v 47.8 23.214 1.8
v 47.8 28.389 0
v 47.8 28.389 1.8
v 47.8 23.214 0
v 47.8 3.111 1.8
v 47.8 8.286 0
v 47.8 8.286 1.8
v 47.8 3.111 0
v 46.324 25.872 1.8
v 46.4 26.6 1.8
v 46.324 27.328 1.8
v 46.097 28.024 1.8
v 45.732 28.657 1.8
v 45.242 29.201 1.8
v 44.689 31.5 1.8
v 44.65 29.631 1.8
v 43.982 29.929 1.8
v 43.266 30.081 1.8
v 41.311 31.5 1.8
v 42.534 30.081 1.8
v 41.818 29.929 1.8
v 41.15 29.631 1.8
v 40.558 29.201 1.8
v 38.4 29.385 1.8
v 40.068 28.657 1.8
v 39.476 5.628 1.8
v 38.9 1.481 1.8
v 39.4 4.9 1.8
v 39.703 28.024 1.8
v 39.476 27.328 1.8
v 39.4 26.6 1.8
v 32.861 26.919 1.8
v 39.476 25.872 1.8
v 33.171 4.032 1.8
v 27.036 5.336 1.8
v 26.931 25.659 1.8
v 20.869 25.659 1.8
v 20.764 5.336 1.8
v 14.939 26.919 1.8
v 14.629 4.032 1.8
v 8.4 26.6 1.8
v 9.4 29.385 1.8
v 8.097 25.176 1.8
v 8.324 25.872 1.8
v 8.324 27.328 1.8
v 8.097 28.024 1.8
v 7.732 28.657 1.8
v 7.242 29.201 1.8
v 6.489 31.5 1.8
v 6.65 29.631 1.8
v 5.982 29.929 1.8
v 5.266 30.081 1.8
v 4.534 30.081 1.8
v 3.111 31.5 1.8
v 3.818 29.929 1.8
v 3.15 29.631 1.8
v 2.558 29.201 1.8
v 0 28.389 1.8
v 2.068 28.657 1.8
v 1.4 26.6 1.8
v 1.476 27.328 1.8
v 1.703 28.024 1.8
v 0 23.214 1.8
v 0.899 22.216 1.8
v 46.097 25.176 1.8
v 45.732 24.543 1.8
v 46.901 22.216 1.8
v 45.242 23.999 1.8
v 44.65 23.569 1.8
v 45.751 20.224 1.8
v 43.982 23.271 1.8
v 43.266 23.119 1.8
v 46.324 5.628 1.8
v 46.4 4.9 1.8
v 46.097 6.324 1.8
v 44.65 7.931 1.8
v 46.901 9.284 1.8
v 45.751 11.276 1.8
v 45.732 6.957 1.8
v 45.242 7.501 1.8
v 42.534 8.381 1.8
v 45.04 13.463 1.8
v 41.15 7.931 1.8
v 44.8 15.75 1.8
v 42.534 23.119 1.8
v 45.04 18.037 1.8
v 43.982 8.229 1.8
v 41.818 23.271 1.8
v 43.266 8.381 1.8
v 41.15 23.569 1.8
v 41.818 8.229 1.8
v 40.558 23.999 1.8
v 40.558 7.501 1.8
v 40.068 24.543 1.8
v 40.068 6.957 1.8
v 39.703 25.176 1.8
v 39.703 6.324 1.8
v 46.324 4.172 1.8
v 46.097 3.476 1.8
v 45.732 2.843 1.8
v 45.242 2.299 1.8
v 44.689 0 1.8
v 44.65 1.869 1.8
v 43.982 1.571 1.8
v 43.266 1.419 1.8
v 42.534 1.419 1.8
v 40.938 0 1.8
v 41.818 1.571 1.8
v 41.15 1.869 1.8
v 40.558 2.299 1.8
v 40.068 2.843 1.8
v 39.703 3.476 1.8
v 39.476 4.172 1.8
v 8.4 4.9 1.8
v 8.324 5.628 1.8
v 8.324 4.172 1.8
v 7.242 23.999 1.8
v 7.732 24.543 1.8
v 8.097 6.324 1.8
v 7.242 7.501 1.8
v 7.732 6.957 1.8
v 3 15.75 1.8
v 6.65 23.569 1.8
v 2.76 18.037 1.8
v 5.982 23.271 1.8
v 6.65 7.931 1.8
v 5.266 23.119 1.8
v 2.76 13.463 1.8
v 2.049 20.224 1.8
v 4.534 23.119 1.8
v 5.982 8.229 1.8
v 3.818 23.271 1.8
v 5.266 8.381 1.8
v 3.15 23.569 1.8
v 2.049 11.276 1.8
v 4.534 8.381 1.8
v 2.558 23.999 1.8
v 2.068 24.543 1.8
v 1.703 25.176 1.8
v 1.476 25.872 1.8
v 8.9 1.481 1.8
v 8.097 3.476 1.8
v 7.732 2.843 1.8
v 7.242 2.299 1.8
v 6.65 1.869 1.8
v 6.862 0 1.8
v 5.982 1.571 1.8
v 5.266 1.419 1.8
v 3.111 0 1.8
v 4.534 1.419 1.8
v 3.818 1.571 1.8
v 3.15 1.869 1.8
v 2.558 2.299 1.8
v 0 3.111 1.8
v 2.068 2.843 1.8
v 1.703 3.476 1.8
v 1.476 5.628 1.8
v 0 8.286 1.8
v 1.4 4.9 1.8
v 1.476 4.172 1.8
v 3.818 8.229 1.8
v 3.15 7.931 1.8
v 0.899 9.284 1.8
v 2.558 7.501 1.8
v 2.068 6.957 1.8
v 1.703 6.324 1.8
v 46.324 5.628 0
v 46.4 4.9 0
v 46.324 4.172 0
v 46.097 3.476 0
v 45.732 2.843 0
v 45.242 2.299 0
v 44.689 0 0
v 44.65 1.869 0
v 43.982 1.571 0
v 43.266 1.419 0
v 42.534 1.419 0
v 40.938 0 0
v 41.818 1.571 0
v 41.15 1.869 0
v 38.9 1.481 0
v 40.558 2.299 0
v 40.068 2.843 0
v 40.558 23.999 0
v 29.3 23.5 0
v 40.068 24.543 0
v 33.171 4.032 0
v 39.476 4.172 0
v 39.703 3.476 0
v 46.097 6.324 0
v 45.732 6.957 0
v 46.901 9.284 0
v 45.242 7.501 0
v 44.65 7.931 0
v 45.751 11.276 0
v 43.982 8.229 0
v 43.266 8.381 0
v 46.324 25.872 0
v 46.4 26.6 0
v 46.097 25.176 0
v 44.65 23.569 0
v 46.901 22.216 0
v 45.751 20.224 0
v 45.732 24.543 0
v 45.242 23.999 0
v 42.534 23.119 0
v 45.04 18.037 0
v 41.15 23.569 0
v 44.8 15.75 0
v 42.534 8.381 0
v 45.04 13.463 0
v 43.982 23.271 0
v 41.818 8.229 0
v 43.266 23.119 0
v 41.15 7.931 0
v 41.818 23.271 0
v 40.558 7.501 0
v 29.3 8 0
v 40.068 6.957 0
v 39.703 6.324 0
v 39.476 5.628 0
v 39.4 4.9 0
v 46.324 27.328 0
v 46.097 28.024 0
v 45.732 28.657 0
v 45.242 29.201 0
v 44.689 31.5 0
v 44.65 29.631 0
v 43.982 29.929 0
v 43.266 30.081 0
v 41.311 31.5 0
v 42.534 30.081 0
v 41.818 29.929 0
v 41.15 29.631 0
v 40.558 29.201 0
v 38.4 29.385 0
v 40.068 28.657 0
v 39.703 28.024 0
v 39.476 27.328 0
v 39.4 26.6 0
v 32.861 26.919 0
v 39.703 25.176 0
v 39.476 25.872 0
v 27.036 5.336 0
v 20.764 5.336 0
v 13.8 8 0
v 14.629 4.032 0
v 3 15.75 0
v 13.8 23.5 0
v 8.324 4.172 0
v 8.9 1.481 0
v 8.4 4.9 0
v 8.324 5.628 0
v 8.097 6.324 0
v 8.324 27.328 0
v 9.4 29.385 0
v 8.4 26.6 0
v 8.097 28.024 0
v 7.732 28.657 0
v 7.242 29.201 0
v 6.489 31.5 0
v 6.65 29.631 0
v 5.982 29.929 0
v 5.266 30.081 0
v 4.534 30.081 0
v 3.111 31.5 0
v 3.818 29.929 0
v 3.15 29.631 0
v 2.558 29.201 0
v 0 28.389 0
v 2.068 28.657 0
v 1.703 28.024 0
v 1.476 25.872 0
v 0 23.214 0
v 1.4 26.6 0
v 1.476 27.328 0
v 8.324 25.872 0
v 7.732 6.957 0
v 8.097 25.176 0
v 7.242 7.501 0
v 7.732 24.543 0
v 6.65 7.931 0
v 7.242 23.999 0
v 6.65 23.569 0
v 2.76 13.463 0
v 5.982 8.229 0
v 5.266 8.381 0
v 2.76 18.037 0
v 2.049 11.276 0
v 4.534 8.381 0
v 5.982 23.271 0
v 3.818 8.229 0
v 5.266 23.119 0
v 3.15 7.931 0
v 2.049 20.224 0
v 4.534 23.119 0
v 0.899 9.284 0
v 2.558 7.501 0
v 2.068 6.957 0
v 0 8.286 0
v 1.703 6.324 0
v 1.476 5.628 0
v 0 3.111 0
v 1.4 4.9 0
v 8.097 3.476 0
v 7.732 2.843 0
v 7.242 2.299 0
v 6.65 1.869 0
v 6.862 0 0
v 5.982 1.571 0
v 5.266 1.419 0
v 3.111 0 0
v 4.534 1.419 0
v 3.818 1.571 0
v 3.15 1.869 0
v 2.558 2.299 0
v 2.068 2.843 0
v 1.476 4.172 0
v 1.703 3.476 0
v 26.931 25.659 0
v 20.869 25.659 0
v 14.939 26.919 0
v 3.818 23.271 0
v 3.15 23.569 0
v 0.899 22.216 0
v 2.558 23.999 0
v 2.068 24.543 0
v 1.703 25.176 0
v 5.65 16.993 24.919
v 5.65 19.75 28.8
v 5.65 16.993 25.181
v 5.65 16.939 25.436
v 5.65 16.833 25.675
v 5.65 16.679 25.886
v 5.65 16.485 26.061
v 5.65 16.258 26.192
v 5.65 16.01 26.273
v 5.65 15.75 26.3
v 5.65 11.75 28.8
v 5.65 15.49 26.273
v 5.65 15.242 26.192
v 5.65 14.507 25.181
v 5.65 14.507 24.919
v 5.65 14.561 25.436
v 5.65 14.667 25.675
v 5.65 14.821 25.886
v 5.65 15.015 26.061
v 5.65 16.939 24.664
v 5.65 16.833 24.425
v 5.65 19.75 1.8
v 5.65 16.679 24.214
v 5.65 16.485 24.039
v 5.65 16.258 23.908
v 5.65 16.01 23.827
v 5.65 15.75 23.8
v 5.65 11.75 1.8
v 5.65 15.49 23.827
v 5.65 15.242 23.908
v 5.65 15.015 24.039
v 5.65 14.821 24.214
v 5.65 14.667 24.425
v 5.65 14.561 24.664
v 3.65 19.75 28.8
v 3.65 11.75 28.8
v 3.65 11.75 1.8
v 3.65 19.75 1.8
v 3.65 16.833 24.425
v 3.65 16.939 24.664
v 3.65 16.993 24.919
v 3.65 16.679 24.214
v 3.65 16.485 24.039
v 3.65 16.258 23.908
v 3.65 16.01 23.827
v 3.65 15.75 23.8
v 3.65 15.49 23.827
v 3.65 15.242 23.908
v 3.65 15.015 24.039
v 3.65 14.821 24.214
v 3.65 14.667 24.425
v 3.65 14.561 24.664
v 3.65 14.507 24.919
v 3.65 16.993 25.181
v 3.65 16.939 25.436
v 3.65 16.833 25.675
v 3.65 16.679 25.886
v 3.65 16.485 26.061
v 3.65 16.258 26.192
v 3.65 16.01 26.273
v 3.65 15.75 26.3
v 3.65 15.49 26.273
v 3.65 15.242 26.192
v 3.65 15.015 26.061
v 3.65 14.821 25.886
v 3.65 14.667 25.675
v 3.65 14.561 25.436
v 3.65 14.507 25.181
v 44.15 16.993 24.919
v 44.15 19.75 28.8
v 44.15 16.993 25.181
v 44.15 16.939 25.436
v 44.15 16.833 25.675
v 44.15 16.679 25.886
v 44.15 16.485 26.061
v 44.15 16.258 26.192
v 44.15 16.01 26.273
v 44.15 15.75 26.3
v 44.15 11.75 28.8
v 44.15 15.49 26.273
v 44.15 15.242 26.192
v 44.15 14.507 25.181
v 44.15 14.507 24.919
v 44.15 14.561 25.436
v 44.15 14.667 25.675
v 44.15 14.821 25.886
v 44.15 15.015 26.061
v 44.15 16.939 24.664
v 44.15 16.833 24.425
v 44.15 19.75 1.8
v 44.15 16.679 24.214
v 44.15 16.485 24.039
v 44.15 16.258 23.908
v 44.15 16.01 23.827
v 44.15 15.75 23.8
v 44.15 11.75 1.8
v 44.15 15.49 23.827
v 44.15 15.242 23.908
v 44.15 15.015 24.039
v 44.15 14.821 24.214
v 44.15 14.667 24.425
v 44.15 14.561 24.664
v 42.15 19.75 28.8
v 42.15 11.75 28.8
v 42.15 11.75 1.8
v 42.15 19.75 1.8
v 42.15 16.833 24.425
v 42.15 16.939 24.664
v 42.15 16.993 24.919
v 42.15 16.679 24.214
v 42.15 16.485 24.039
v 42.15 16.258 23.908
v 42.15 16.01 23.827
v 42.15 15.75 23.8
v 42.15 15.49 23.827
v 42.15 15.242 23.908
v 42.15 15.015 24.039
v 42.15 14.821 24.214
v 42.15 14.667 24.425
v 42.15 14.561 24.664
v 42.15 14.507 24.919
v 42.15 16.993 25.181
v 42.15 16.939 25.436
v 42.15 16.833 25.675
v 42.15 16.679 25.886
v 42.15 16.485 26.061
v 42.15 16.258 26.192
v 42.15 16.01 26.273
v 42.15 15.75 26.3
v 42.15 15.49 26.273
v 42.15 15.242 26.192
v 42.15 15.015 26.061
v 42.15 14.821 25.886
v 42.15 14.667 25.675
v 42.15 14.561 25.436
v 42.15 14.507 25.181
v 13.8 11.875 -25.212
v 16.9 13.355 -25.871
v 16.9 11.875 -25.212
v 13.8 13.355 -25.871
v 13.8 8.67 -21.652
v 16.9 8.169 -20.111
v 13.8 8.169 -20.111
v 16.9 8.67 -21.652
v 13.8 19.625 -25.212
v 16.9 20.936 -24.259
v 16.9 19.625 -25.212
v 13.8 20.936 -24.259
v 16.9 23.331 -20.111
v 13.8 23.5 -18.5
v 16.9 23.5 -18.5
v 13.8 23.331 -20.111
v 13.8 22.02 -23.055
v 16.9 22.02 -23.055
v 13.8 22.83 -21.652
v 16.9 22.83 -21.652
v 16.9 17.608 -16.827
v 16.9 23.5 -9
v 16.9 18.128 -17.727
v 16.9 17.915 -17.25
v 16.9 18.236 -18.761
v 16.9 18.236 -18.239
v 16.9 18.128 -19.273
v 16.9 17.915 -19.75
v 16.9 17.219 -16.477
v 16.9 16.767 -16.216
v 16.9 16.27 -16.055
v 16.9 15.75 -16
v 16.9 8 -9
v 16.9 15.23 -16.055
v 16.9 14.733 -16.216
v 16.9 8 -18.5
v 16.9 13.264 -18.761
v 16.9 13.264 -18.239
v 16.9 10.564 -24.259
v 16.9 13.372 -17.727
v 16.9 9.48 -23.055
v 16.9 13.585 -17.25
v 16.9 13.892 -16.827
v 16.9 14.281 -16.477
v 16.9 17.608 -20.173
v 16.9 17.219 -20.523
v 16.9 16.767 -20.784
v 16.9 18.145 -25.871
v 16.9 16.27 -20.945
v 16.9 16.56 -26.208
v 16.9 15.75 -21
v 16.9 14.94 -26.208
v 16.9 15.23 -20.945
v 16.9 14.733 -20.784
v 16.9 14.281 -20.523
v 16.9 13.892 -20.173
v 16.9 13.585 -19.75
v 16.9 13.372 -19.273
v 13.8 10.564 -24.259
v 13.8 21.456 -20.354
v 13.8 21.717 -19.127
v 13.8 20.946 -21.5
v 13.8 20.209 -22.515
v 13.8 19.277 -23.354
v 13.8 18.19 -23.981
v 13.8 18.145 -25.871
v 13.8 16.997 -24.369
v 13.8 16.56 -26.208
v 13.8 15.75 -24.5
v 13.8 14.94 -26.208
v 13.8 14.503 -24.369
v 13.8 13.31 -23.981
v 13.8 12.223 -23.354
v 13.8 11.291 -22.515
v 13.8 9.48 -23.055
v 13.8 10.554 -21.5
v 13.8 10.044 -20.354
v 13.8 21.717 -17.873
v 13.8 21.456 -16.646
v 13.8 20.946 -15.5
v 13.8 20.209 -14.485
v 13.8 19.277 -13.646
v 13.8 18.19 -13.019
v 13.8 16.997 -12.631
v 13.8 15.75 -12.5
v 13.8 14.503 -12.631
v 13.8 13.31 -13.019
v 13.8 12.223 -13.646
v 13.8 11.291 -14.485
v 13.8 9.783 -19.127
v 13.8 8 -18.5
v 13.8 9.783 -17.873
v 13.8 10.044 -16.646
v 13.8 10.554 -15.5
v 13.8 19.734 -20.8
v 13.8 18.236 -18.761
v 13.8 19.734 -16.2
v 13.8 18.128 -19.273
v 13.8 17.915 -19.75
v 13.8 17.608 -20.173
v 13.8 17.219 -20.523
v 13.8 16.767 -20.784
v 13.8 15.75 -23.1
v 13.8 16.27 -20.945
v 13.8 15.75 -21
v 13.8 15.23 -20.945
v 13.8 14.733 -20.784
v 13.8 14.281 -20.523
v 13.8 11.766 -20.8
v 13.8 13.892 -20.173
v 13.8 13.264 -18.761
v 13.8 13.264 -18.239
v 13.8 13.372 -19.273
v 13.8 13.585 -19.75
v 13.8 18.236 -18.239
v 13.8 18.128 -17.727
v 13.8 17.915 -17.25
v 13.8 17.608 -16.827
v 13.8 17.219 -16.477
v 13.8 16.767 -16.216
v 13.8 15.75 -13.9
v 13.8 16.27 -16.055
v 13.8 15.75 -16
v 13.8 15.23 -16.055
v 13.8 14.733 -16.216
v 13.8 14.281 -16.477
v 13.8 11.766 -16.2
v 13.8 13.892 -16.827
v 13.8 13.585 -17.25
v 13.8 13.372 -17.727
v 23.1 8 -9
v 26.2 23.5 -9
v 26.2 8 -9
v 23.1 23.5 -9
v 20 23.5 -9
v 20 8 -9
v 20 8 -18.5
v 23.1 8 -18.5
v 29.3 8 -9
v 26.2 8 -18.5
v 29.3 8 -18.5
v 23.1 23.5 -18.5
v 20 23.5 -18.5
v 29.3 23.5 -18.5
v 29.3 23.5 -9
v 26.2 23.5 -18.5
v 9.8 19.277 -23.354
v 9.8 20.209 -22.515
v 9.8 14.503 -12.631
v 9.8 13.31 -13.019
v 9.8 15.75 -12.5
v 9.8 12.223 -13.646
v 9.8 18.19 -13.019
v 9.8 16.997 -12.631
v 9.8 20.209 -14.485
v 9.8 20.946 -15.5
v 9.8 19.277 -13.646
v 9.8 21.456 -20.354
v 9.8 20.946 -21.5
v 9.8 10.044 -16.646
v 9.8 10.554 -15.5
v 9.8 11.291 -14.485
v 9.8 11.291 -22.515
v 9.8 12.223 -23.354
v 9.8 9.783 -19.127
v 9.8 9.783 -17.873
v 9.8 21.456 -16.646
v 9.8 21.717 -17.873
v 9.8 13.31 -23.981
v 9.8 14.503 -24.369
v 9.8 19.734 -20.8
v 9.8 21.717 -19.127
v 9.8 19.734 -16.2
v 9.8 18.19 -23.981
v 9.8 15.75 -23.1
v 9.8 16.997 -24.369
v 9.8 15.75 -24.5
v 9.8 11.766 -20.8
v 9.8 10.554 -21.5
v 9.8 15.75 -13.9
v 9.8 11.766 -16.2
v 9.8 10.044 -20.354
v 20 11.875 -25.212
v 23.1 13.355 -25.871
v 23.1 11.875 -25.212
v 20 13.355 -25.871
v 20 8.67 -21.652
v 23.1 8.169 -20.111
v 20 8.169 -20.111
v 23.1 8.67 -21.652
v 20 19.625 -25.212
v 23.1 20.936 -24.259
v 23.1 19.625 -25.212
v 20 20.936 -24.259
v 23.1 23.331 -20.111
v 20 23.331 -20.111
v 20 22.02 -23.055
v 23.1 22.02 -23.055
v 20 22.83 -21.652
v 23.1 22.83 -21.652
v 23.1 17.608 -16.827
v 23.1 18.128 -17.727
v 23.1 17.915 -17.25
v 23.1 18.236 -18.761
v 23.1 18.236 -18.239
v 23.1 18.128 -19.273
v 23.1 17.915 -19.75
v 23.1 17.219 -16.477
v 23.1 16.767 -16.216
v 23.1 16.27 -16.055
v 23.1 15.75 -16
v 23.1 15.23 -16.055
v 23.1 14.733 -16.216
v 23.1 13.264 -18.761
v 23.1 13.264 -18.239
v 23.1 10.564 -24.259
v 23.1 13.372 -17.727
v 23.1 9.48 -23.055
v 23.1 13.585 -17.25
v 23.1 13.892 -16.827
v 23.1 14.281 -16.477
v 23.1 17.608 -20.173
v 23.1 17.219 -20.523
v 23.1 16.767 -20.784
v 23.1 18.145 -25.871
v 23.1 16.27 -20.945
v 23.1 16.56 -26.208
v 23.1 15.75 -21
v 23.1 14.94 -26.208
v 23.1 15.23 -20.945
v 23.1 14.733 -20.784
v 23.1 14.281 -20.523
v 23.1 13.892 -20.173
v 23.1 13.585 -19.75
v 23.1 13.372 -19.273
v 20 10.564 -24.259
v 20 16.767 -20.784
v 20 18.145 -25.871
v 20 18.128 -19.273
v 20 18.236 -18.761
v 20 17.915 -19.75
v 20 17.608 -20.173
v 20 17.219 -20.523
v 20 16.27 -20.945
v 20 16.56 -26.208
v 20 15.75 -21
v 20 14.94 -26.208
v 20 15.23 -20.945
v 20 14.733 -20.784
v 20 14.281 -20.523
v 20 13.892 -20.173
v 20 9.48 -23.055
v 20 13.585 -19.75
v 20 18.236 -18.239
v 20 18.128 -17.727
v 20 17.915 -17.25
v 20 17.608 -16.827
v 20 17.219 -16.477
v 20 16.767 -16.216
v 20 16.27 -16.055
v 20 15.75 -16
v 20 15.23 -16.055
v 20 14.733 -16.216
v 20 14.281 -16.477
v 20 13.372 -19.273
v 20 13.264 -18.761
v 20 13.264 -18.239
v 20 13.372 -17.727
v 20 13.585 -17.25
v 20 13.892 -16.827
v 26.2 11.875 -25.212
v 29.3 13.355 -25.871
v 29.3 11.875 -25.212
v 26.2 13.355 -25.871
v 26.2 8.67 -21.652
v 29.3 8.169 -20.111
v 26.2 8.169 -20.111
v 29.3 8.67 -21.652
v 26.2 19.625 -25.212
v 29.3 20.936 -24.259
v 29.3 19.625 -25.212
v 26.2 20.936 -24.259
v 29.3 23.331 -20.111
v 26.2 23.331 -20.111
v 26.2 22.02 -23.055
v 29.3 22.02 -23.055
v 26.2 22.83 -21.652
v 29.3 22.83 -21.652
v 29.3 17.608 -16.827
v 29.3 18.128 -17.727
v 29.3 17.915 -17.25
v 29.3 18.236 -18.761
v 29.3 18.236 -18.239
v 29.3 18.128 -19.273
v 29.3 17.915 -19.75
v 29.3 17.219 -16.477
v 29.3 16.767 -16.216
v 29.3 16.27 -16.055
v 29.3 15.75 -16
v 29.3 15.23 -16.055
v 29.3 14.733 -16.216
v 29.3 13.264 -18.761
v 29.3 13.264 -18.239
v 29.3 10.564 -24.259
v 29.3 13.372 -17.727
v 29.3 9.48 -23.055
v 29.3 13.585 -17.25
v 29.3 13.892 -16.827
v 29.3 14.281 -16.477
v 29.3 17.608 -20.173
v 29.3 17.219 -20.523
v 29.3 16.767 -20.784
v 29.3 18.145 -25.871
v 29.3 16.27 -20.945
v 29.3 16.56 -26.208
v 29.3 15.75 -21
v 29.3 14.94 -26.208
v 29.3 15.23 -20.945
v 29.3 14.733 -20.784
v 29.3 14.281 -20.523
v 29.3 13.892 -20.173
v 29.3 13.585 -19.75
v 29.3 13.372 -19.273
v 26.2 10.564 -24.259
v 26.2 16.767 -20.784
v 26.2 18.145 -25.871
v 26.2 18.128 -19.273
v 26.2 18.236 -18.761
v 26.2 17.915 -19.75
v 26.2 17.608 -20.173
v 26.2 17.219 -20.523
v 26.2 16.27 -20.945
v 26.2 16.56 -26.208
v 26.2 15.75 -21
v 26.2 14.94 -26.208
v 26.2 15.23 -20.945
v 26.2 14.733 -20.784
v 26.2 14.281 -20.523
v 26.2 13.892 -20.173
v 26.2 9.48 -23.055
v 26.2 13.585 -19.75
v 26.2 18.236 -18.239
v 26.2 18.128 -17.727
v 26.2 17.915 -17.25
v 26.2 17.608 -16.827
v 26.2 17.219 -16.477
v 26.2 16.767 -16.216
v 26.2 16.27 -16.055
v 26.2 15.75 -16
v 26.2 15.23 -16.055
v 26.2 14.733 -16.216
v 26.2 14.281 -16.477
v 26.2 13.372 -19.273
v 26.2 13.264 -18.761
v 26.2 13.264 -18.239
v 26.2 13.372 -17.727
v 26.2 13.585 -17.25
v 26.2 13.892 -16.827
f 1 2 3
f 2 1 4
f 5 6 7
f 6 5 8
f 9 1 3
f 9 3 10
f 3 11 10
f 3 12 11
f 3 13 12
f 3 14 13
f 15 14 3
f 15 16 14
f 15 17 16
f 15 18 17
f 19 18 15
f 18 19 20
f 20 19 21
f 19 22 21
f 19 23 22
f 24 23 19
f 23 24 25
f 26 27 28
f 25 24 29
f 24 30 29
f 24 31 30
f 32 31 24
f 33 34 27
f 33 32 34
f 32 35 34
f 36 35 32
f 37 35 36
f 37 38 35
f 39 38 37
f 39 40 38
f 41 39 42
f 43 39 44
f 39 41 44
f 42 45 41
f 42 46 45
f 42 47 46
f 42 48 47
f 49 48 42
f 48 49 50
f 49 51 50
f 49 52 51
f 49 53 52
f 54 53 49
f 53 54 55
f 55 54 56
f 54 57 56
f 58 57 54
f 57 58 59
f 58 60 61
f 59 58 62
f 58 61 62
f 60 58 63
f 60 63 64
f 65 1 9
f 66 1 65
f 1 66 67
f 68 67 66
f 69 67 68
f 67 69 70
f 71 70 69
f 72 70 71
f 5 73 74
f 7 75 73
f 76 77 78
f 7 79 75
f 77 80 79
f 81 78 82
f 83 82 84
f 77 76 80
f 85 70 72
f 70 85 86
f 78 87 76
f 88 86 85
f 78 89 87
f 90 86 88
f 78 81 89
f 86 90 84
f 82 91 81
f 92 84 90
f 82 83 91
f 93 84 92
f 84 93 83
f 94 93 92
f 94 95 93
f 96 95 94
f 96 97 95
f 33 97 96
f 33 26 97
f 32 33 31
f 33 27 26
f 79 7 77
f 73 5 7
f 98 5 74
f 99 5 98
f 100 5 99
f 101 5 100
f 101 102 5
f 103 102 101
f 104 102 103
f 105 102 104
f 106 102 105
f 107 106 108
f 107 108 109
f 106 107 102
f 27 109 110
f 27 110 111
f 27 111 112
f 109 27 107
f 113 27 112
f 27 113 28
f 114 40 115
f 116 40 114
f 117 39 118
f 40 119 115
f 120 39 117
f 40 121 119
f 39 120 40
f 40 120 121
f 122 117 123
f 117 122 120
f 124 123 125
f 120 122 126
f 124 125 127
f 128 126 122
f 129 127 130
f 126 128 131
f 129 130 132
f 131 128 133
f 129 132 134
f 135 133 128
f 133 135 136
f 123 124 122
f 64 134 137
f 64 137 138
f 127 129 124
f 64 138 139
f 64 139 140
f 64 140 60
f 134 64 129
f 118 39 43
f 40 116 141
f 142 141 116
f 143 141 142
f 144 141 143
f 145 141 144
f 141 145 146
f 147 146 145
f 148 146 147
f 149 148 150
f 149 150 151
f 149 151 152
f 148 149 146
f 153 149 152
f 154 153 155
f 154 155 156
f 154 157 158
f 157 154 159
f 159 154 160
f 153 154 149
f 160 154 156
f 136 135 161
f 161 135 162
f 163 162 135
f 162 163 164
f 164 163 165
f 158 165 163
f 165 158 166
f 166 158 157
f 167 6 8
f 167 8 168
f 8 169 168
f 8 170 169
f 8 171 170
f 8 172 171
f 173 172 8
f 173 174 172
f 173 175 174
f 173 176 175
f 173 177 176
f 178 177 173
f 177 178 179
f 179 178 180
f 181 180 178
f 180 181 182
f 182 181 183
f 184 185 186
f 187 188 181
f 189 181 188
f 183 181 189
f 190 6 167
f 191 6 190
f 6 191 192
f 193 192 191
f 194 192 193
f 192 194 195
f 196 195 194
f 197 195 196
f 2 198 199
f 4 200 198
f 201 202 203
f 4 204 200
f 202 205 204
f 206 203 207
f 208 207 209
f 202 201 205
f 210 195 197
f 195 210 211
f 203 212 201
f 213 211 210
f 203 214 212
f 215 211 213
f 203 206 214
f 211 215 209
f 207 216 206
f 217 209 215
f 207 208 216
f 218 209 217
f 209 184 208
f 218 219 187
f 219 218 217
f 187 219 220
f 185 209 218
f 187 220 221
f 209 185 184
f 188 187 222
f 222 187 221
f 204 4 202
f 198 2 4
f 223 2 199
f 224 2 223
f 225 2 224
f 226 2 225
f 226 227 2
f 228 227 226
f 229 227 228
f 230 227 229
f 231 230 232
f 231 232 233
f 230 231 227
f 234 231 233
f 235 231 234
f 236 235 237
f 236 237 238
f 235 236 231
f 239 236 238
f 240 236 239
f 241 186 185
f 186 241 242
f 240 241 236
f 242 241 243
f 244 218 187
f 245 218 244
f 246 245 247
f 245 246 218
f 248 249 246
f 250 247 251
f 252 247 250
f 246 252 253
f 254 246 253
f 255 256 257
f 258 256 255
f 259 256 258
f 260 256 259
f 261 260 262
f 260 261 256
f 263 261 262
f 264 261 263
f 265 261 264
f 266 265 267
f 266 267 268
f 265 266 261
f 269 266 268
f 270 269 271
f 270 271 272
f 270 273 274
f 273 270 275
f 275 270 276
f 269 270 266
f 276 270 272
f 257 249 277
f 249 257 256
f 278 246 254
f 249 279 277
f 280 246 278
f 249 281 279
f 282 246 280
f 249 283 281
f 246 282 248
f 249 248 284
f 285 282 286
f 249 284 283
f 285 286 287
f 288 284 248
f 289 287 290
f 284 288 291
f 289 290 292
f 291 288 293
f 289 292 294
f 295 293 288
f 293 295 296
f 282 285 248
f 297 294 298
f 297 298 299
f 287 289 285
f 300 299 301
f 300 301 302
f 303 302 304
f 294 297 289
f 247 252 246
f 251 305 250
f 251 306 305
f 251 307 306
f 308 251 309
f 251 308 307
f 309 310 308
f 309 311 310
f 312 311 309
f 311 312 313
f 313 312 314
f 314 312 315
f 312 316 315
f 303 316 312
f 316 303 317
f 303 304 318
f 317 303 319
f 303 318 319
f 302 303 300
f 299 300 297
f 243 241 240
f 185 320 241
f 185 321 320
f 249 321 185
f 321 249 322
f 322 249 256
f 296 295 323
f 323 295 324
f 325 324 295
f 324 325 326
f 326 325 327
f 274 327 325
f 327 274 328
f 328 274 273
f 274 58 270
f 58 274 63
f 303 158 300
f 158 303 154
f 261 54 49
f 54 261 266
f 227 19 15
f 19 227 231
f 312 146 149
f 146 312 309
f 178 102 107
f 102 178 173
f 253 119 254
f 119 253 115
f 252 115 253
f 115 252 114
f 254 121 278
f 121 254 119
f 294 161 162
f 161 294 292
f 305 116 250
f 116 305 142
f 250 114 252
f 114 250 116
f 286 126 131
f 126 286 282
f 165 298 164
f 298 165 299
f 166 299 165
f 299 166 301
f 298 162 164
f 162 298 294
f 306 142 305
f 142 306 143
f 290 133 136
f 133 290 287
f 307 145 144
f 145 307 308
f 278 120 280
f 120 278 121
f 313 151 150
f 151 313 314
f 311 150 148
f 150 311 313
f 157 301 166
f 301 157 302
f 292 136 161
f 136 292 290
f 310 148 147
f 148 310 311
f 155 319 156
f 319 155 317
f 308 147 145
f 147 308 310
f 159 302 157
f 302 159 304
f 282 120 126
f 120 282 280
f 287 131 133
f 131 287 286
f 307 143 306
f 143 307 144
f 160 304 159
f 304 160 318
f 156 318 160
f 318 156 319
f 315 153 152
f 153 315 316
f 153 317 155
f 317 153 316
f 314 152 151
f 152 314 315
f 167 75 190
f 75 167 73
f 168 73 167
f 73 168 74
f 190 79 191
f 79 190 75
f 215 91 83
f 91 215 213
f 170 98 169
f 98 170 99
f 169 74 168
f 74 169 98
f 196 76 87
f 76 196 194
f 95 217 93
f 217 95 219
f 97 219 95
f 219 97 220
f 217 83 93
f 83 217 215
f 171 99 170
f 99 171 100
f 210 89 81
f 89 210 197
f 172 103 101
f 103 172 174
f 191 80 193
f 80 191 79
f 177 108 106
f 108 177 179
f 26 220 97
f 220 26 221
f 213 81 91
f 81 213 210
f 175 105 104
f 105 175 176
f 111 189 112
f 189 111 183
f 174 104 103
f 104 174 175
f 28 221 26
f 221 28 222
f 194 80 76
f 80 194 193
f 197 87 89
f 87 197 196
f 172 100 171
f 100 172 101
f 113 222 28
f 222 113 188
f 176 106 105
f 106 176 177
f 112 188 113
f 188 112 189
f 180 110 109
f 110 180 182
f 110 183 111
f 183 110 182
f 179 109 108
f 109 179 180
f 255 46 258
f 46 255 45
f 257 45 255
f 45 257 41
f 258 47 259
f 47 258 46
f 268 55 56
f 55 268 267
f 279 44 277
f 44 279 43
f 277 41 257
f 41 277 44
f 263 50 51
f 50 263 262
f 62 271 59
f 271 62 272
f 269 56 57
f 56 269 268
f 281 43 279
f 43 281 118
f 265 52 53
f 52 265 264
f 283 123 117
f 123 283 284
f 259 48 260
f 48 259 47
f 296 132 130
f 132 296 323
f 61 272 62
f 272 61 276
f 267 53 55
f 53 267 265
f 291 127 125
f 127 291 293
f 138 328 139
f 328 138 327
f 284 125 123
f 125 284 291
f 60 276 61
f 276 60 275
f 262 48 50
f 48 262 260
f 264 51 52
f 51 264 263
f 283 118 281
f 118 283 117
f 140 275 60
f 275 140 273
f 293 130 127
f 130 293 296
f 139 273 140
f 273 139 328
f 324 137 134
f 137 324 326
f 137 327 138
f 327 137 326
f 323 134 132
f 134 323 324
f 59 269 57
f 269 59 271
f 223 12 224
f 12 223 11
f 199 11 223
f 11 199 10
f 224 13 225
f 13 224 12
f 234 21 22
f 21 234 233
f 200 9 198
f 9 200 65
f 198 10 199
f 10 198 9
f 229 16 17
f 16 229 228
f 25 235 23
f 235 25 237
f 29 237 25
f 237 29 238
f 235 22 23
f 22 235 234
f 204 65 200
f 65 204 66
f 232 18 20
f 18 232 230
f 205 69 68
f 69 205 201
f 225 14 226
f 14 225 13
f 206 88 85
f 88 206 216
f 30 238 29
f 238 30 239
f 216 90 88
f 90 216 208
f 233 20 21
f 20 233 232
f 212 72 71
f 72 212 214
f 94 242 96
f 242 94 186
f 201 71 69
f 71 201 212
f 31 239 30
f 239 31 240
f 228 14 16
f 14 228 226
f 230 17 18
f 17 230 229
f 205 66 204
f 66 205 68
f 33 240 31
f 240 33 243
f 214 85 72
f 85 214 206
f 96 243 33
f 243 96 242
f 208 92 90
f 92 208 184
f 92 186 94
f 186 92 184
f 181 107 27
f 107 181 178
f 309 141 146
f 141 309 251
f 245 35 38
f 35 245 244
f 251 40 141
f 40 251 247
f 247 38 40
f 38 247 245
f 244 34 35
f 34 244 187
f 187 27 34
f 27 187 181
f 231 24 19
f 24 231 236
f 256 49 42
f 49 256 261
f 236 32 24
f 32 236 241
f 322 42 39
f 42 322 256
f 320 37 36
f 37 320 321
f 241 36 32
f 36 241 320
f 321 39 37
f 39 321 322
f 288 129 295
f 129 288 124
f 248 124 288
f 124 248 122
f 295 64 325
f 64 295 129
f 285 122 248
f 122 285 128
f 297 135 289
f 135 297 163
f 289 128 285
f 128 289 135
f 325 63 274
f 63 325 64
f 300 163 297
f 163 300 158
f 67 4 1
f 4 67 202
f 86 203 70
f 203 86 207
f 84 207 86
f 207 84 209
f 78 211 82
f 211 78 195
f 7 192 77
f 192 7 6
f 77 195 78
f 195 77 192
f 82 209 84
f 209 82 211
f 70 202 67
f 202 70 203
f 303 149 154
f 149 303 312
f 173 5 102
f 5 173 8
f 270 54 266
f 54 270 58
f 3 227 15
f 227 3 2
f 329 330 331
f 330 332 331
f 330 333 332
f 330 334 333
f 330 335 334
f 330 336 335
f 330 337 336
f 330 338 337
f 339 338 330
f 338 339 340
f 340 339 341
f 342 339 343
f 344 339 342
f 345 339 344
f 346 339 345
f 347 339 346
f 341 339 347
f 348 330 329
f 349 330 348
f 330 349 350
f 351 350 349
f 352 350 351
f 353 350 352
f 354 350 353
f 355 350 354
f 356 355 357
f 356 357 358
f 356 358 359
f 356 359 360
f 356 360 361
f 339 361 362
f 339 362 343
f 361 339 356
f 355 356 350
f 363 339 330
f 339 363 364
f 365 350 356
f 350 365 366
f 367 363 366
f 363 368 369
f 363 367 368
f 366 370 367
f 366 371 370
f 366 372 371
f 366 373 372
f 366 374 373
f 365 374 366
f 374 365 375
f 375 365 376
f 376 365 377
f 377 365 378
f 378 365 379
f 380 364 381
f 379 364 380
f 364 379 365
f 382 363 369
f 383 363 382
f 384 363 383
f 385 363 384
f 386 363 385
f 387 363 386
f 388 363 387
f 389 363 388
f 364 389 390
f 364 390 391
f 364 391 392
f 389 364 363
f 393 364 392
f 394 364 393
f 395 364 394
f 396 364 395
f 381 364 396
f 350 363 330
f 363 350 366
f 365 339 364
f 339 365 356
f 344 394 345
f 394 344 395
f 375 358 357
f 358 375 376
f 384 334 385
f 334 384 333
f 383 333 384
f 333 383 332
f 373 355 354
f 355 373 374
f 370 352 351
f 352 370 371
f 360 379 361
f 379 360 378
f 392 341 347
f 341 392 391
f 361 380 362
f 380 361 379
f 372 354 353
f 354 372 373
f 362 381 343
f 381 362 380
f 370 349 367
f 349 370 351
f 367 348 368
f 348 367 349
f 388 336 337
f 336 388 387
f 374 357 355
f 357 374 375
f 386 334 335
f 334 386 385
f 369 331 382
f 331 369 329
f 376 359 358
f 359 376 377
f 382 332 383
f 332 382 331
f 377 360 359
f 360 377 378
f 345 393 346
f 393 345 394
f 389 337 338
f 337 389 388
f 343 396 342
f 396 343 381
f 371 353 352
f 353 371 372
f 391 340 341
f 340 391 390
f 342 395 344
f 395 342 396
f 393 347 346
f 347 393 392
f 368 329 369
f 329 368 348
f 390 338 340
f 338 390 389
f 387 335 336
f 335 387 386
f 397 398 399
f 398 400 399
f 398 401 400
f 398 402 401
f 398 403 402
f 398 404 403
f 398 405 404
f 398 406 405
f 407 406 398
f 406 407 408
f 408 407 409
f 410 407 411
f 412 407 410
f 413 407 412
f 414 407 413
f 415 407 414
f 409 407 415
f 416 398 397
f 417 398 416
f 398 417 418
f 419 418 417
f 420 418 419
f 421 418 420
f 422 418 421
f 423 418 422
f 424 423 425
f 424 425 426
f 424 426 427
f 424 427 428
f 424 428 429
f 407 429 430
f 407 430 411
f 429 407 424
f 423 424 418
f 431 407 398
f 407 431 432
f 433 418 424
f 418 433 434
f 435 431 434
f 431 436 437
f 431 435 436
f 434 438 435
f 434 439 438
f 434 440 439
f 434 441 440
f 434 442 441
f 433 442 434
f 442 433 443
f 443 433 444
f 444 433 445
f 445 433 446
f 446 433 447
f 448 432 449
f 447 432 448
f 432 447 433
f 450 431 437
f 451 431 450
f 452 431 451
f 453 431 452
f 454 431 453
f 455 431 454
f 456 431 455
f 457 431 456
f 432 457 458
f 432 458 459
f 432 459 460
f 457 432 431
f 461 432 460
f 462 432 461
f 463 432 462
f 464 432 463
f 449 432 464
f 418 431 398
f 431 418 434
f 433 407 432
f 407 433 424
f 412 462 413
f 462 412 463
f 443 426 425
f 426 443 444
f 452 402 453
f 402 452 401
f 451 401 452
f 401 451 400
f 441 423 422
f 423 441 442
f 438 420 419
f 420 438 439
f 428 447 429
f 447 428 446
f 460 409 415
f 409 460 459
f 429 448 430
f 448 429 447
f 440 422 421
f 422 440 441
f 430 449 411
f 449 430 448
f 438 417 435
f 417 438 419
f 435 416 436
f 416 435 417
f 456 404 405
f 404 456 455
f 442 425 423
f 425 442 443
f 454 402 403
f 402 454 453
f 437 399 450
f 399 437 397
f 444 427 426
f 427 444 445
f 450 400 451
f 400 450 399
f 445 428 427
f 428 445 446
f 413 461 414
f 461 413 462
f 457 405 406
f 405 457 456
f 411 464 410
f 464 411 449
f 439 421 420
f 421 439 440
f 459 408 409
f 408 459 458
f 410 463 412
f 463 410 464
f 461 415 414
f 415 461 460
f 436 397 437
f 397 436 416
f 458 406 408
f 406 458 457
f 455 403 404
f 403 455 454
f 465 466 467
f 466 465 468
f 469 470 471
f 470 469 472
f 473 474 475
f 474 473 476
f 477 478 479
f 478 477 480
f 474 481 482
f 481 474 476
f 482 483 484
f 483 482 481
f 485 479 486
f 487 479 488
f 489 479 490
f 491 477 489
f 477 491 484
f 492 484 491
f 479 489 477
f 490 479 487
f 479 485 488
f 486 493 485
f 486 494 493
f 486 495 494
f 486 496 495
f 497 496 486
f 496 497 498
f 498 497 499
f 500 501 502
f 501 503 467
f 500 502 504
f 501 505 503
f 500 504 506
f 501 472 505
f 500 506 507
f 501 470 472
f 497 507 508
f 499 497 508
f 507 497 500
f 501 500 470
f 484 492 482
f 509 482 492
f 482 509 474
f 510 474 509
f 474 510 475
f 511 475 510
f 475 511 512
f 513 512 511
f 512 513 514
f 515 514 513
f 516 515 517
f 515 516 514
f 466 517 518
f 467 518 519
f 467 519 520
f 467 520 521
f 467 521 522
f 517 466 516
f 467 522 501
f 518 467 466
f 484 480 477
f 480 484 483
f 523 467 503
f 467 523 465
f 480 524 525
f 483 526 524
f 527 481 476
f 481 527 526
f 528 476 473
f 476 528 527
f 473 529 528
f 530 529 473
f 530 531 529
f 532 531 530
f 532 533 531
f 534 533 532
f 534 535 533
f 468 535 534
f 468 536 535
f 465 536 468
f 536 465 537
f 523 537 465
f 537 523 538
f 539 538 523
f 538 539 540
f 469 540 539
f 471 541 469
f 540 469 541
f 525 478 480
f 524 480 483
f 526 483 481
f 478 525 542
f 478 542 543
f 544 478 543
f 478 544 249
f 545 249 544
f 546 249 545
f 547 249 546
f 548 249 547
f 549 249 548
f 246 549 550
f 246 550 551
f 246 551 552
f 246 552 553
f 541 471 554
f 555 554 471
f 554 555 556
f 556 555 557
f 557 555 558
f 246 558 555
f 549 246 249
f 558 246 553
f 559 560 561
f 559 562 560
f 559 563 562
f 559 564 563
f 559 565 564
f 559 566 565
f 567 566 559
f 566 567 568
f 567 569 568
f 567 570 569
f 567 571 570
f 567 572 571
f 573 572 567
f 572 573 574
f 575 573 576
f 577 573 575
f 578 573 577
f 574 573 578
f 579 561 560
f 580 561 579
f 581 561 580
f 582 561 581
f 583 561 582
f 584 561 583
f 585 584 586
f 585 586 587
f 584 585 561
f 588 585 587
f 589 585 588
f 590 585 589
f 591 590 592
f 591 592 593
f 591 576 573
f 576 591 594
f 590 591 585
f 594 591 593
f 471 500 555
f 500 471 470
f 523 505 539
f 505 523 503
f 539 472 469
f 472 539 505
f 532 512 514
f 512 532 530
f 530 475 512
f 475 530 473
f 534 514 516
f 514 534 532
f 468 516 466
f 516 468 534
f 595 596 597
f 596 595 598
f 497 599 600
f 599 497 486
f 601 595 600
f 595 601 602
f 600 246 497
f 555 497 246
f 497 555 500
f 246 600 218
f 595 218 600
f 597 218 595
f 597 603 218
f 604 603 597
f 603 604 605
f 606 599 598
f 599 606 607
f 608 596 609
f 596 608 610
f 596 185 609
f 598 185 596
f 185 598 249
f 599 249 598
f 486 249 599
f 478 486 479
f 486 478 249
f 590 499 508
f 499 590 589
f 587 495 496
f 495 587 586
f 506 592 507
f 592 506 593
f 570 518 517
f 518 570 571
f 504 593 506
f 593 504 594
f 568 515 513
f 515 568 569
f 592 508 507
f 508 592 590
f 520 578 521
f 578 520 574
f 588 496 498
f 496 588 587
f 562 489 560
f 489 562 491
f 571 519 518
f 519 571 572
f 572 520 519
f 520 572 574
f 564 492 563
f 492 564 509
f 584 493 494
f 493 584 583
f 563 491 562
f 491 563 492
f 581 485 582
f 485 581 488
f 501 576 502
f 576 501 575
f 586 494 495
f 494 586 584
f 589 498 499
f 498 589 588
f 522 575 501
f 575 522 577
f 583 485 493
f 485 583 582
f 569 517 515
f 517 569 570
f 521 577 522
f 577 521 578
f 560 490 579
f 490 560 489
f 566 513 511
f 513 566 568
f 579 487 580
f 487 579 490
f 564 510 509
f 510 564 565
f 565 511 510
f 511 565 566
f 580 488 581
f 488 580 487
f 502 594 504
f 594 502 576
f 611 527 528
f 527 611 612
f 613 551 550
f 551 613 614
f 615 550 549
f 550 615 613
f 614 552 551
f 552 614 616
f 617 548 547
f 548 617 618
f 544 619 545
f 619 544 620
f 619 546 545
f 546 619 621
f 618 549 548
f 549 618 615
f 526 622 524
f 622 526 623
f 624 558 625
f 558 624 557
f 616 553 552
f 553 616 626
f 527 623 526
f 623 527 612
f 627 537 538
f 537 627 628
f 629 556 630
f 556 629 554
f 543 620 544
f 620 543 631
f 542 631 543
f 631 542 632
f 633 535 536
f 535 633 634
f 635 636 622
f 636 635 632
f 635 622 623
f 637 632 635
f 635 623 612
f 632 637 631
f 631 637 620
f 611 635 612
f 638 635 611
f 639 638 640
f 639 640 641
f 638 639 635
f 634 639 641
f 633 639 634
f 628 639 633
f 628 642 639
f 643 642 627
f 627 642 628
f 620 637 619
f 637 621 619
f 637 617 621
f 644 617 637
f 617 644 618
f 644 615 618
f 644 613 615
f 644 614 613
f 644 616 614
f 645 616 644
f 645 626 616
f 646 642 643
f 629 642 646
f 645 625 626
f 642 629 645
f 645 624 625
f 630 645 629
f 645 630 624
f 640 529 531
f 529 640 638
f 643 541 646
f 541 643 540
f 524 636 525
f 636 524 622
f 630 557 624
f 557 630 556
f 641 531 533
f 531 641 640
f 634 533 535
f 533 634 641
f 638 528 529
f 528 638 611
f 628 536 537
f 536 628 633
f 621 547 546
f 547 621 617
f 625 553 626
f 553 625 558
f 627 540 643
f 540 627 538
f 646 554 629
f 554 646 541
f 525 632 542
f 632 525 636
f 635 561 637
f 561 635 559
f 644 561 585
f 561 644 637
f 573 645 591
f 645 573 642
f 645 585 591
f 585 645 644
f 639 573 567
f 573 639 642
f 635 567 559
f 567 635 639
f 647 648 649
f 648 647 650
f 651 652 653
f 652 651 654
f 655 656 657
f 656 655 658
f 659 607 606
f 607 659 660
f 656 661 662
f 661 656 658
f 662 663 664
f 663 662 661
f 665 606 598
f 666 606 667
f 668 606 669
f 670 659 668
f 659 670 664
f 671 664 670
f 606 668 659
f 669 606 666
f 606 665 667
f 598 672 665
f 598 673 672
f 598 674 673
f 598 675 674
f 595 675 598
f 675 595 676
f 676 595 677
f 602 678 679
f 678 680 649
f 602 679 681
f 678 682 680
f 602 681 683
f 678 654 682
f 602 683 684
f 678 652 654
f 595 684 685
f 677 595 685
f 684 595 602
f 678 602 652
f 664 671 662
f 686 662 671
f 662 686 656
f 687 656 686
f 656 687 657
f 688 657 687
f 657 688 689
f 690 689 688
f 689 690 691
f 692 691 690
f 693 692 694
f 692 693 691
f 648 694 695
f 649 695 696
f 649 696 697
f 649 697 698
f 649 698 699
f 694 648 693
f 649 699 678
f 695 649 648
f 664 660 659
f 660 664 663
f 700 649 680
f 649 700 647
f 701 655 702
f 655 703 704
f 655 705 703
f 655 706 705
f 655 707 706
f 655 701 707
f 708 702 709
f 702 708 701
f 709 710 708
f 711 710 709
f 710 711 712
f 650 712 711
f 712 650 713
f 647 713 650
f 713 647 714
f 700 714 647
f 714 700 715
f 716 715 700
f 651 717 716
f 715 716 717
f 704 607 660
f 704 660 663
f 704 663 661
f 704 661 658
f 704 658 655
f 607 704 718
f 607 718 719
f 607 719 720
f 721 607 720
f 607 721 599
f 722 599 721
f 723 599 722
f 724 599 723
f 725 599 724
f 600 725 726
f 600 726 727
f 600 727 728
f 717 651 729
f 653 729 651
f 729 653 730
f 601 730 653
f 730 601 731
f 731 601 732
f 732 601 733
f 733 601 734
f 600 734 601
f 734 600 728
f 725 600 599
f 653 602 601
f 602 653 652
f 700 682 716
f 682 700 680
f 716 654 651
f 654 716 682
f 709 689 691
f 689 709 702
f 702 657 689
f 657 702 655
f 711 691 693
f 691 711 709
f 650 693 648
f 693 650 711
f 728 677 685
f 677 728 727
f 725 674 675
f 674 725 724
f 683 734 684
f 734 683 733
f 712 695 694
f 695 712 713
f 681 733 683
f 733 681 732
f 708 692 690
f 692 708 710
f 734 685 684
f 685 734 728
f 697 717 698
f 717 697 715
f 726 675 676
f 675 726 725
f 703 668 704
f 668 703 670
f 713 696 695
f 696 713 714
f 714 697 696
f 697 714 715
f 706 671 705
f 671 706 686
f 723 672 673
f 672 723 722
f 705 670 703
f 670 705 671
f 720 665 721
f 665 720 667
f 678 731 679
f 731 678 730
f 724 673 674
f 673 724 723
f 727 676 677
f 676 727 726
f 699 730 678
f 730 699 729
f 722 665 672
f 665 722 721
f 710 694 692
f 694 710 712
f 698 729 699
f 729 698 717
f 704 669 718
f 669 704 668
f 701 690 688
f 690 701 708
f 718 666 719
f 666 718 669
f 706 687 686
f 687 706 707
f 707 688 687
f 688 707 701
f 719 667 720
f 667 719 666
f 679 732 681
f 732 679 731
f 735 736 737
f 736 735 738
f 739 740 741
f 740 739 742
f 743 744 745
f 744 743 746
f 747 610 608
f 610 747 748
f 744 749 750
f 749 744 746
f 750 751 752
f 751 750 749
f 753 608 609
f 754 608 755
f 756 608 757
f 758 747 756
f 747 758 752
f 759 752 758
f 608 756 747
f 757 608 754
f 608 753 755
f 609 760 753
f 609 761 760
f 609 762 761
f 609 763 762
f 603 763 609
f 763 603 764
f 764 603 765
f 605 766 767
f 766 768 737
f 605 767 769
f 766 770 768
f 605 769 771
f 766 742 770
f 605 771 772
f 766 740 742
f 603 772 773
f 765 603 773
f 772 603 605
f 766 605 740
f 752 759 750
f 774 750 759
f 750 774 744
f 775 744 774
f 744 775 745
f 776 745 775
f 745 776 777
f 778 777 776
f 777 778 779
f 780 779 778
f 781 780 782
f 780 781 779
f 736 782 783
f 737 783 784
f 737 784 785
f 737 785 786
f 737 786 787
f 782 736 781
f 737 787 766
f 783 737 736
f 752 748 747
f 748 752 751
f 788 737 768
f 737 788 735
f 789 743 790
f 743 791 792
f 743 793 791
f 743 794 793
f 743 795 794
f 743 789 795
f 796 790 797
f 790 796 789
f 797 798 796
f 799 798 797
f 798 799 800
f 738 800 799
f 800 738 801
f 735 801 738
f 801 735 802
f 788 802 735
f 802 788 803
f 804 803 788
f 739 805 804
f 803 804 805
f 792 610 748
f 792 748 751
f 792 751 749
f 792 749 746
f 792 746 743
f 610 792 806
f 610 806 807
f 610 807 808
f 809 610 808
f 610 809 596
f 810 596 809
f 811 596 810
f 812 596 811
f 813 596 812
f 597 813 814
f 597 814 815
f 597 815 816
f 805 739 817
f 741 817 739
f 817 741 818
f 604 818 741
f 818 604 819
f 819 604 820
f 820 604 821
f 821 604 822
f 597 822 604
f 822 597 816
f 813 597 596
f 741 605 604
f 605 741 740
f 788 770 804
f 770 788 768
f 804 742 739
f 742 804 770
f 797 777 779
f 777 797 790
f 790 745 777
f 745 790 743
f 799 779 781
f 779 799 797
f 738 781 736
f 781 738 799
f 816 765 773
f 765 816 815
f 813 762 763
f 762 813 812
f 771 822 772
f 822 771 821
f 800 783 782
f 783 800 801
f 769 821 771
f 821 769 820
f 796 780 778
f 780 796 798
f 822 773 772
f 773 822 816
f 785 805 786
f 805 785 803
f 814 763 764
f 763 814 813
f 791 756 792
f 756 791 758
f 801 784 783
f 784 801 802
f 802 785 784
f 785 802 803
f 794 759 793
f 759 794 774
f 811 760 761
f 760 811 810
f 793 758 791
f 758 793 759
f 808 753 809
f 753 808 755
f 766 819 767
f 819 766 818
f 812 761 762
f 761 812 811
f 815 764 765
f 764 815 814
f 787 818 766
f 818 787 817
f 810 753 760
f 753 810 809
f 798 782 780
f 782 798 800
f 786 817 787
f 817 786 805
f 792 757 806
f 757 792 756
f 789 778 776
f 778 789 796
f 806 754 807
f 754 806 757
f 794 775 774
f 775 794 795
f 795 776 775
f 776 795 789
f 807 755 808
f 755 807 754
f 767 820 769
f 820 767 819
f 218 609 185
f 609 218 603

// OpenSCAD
/*
 * Created by:
 * Thomas Buck <xythobuz@xythobuz.de> in May 2016
 *
 * Licensed under the
 * Creative Commons - Attribution - Share Alike license.
 */

// -----------------------------------------------------------

width_outer = 47.8;
height_outer = 31.5;
hole = 7;
depth = 1.8;
wall = 1.4;
inner_y_offset = -1;
diameter_big = 58;
offset_big = 23;
diameter_mid = 60;
offset_mid = 24.5;
diameter_small = 22;
offset_small = 8;

fpv_width = 36.5;
fpv_depth = 11;
fpv_offset = 5;
fpv_hole = 2.5;
fpv_holder_width = 8;
fpv_holder_top = 2.5;
fpv_wall = 2;

cam_depth = 15.5;
cam_base_height = 9;
cam_arm_height = 17;
cam_arm_hole_dist = 9.5;
cam_arm_hole = 5;
cam_arm_width = 3.1;
cam_arm_dist = 3.1;
cam_nut_outer = 12;
cam_nut_inner = 9.2;
cam_nut_height = 4;
cam_holder_offset = 13.8;

$fn = 30;

// -----------------------------------------------------------

module half_cylinder(d, h) {
    rotate([0, 0, 180])
    difference() {
        cylinder(d = d, h = h);
        translate([-(d / 2), 0, -1])
            cube([d, d / 2, h + 2]);
    }
}

module cam_arm() {
    difference() {
        union() {
            cube([cam_arm_width, cam_depth, cam_arm_hole_dist]);
            translate([0, cam_depth / 2, cam_arm_hole_dist])
                rotate([90, 0, 90])
                half_cylinder(cam_depth, cam_arm_width);
        }
        
        translate([-1, cam_depth / 2, cam_arm_hole_dist])
            rotate([0, 90, 0])
            cylinder(d = cam_arm_hole, h = cam_arm_width + 2);
    }
}

module cam_arm_nut() {
    translate([-cam_nut_height, 0, 0])
    rotate([0, 90, 0])
    difference() {
        cylinder(d = cam_nut_outer, h = cam_nut_height);
        translate([0, 0, -1])
            cylinder(d = cam_nut_inner, h = cam_nut_height + 2, $fn = 6);
    }
}

module cam_holder() {
    cube([(3 * cam_arm_width) + (2 * cam_arm_dist), cam_depth, cam_base_height]);
    
    translate([0, 0, cam_base_height])
        cam_arm();
    
    translate([0, cam_depth / 2, cam_base_height + cam_arm_hole_dist])
        cam_arm_nut();
    
    translate([cam_arm_width + cam_arm_dist, 0, cam_base_height])
        cam_arm();
    
    translate([2 * (cam_arm_width + cam_arm_dist), 0, cam_base_height])
        cam_arm();
}

module base() {
    difference() {
        cube([width_outer, height_outer, depth]);
        
        translate([wall + (hole / 2), wall + (hole / 2), -1])
            cylinder(d = hole, h = depth + 2);
        
        translate([width_outer - wall - (hole / 2), wall + (hole / 2), -1])
            cylinder(d = hole, h = depth + 2);
        
        translate([wall + (hole / 2), height_outer - wall - (hole / 2), -1])
            cylinder(d = hole, h = depth + 2);
        
        translate([width_outer - wall - (hole / 2), height_outer - wall - (hole / 2), -1])
            cylinder(d = hole, h = depth + 2);
        
        translate([width_outer / 2, -offset_mid, -1])
            cylinder(d = diameter_mid, h = depth + 2);
        
        translate([width_outer / 2, height_outer + offset_big, -1])
            cylinder(d = diameter_big, h = depth + 2);
        
        translate([-offset_small, height_outer / 2, -1])
            cylinder(d = diameter_small, h = depth + 2);
            
        translate([width_outer + offset_small, height_outer / 2, -1])
            cylinder(d = diameter_small, h = depth + 2);
            
        translate([0, 0, -1])
            rotate([0, 0, 45])
            translate([-2.8, -2.8, 0])
            cube([5, 5, depth + 2]);
            
        translate([width_outer, 0, -1])
            rotate([0, 0, 45])
            translate([-2.8, -2.8, 0])
            cube([5, 5, depth + 2]);
            
        translate([0, height_outer, -1])
            rotate([0, 0, 45])
            translate([-2.8, -2.2, 0])
            cube([5, 5, depth + 2]);
        
        translate([width_outer, height_outer, -1])
            rotate([0, 0, 45])
            translate([-2.2, -2.2, 0])
            cube([5, 5, depth + 2]);
    }
}

module arm() {
    difference() {
        cube([fpv_wall, fpv_holder_width, fpv_offset + (fpv_width / 2) + (fpv_hole / 2) + fpv_holder_top]);
        
        translate([-1, fpv_holder_width / 2, fpv_offset + (fpv_width / 2)])
            rotate([0, 90, 0])
            cylinder(d = fpv_hole, h = fpv_wall + 2);
    }
}

module fpv_holder() {
    arm();
    
    translate([fpv_width + fpv_wall, 0, 0])
        arm();
}

// -----------------------------------------------------------

base();

translate([(width_outer - fpv_width) / 2 - fpv_wall, (height_outer - fpv_holder_width) / 2, depth])
    fpv_holder();

translate([cam_holder_offset, (height_outer + cam_depth) / 2, 0])
    rotate([180, 0, 0])
    cam_holder();

// -----------------------------------------------------------
/*
%translate([(width_outer - fpv_width) / 2, (height_outer - fpv_depth) / 2, depth + fpv_offset])
    cube([fpv_width, fpv_depth, fpv_width]);

%translate([width_outer / 2, (height_outer - fpv_depth) / 2 + 1, depth + fpv_offset + (fpv_width / 2)])
    rotate([90, 0, 0])
    cylinder(d = fpv_width / 3, h = 8);
*/
